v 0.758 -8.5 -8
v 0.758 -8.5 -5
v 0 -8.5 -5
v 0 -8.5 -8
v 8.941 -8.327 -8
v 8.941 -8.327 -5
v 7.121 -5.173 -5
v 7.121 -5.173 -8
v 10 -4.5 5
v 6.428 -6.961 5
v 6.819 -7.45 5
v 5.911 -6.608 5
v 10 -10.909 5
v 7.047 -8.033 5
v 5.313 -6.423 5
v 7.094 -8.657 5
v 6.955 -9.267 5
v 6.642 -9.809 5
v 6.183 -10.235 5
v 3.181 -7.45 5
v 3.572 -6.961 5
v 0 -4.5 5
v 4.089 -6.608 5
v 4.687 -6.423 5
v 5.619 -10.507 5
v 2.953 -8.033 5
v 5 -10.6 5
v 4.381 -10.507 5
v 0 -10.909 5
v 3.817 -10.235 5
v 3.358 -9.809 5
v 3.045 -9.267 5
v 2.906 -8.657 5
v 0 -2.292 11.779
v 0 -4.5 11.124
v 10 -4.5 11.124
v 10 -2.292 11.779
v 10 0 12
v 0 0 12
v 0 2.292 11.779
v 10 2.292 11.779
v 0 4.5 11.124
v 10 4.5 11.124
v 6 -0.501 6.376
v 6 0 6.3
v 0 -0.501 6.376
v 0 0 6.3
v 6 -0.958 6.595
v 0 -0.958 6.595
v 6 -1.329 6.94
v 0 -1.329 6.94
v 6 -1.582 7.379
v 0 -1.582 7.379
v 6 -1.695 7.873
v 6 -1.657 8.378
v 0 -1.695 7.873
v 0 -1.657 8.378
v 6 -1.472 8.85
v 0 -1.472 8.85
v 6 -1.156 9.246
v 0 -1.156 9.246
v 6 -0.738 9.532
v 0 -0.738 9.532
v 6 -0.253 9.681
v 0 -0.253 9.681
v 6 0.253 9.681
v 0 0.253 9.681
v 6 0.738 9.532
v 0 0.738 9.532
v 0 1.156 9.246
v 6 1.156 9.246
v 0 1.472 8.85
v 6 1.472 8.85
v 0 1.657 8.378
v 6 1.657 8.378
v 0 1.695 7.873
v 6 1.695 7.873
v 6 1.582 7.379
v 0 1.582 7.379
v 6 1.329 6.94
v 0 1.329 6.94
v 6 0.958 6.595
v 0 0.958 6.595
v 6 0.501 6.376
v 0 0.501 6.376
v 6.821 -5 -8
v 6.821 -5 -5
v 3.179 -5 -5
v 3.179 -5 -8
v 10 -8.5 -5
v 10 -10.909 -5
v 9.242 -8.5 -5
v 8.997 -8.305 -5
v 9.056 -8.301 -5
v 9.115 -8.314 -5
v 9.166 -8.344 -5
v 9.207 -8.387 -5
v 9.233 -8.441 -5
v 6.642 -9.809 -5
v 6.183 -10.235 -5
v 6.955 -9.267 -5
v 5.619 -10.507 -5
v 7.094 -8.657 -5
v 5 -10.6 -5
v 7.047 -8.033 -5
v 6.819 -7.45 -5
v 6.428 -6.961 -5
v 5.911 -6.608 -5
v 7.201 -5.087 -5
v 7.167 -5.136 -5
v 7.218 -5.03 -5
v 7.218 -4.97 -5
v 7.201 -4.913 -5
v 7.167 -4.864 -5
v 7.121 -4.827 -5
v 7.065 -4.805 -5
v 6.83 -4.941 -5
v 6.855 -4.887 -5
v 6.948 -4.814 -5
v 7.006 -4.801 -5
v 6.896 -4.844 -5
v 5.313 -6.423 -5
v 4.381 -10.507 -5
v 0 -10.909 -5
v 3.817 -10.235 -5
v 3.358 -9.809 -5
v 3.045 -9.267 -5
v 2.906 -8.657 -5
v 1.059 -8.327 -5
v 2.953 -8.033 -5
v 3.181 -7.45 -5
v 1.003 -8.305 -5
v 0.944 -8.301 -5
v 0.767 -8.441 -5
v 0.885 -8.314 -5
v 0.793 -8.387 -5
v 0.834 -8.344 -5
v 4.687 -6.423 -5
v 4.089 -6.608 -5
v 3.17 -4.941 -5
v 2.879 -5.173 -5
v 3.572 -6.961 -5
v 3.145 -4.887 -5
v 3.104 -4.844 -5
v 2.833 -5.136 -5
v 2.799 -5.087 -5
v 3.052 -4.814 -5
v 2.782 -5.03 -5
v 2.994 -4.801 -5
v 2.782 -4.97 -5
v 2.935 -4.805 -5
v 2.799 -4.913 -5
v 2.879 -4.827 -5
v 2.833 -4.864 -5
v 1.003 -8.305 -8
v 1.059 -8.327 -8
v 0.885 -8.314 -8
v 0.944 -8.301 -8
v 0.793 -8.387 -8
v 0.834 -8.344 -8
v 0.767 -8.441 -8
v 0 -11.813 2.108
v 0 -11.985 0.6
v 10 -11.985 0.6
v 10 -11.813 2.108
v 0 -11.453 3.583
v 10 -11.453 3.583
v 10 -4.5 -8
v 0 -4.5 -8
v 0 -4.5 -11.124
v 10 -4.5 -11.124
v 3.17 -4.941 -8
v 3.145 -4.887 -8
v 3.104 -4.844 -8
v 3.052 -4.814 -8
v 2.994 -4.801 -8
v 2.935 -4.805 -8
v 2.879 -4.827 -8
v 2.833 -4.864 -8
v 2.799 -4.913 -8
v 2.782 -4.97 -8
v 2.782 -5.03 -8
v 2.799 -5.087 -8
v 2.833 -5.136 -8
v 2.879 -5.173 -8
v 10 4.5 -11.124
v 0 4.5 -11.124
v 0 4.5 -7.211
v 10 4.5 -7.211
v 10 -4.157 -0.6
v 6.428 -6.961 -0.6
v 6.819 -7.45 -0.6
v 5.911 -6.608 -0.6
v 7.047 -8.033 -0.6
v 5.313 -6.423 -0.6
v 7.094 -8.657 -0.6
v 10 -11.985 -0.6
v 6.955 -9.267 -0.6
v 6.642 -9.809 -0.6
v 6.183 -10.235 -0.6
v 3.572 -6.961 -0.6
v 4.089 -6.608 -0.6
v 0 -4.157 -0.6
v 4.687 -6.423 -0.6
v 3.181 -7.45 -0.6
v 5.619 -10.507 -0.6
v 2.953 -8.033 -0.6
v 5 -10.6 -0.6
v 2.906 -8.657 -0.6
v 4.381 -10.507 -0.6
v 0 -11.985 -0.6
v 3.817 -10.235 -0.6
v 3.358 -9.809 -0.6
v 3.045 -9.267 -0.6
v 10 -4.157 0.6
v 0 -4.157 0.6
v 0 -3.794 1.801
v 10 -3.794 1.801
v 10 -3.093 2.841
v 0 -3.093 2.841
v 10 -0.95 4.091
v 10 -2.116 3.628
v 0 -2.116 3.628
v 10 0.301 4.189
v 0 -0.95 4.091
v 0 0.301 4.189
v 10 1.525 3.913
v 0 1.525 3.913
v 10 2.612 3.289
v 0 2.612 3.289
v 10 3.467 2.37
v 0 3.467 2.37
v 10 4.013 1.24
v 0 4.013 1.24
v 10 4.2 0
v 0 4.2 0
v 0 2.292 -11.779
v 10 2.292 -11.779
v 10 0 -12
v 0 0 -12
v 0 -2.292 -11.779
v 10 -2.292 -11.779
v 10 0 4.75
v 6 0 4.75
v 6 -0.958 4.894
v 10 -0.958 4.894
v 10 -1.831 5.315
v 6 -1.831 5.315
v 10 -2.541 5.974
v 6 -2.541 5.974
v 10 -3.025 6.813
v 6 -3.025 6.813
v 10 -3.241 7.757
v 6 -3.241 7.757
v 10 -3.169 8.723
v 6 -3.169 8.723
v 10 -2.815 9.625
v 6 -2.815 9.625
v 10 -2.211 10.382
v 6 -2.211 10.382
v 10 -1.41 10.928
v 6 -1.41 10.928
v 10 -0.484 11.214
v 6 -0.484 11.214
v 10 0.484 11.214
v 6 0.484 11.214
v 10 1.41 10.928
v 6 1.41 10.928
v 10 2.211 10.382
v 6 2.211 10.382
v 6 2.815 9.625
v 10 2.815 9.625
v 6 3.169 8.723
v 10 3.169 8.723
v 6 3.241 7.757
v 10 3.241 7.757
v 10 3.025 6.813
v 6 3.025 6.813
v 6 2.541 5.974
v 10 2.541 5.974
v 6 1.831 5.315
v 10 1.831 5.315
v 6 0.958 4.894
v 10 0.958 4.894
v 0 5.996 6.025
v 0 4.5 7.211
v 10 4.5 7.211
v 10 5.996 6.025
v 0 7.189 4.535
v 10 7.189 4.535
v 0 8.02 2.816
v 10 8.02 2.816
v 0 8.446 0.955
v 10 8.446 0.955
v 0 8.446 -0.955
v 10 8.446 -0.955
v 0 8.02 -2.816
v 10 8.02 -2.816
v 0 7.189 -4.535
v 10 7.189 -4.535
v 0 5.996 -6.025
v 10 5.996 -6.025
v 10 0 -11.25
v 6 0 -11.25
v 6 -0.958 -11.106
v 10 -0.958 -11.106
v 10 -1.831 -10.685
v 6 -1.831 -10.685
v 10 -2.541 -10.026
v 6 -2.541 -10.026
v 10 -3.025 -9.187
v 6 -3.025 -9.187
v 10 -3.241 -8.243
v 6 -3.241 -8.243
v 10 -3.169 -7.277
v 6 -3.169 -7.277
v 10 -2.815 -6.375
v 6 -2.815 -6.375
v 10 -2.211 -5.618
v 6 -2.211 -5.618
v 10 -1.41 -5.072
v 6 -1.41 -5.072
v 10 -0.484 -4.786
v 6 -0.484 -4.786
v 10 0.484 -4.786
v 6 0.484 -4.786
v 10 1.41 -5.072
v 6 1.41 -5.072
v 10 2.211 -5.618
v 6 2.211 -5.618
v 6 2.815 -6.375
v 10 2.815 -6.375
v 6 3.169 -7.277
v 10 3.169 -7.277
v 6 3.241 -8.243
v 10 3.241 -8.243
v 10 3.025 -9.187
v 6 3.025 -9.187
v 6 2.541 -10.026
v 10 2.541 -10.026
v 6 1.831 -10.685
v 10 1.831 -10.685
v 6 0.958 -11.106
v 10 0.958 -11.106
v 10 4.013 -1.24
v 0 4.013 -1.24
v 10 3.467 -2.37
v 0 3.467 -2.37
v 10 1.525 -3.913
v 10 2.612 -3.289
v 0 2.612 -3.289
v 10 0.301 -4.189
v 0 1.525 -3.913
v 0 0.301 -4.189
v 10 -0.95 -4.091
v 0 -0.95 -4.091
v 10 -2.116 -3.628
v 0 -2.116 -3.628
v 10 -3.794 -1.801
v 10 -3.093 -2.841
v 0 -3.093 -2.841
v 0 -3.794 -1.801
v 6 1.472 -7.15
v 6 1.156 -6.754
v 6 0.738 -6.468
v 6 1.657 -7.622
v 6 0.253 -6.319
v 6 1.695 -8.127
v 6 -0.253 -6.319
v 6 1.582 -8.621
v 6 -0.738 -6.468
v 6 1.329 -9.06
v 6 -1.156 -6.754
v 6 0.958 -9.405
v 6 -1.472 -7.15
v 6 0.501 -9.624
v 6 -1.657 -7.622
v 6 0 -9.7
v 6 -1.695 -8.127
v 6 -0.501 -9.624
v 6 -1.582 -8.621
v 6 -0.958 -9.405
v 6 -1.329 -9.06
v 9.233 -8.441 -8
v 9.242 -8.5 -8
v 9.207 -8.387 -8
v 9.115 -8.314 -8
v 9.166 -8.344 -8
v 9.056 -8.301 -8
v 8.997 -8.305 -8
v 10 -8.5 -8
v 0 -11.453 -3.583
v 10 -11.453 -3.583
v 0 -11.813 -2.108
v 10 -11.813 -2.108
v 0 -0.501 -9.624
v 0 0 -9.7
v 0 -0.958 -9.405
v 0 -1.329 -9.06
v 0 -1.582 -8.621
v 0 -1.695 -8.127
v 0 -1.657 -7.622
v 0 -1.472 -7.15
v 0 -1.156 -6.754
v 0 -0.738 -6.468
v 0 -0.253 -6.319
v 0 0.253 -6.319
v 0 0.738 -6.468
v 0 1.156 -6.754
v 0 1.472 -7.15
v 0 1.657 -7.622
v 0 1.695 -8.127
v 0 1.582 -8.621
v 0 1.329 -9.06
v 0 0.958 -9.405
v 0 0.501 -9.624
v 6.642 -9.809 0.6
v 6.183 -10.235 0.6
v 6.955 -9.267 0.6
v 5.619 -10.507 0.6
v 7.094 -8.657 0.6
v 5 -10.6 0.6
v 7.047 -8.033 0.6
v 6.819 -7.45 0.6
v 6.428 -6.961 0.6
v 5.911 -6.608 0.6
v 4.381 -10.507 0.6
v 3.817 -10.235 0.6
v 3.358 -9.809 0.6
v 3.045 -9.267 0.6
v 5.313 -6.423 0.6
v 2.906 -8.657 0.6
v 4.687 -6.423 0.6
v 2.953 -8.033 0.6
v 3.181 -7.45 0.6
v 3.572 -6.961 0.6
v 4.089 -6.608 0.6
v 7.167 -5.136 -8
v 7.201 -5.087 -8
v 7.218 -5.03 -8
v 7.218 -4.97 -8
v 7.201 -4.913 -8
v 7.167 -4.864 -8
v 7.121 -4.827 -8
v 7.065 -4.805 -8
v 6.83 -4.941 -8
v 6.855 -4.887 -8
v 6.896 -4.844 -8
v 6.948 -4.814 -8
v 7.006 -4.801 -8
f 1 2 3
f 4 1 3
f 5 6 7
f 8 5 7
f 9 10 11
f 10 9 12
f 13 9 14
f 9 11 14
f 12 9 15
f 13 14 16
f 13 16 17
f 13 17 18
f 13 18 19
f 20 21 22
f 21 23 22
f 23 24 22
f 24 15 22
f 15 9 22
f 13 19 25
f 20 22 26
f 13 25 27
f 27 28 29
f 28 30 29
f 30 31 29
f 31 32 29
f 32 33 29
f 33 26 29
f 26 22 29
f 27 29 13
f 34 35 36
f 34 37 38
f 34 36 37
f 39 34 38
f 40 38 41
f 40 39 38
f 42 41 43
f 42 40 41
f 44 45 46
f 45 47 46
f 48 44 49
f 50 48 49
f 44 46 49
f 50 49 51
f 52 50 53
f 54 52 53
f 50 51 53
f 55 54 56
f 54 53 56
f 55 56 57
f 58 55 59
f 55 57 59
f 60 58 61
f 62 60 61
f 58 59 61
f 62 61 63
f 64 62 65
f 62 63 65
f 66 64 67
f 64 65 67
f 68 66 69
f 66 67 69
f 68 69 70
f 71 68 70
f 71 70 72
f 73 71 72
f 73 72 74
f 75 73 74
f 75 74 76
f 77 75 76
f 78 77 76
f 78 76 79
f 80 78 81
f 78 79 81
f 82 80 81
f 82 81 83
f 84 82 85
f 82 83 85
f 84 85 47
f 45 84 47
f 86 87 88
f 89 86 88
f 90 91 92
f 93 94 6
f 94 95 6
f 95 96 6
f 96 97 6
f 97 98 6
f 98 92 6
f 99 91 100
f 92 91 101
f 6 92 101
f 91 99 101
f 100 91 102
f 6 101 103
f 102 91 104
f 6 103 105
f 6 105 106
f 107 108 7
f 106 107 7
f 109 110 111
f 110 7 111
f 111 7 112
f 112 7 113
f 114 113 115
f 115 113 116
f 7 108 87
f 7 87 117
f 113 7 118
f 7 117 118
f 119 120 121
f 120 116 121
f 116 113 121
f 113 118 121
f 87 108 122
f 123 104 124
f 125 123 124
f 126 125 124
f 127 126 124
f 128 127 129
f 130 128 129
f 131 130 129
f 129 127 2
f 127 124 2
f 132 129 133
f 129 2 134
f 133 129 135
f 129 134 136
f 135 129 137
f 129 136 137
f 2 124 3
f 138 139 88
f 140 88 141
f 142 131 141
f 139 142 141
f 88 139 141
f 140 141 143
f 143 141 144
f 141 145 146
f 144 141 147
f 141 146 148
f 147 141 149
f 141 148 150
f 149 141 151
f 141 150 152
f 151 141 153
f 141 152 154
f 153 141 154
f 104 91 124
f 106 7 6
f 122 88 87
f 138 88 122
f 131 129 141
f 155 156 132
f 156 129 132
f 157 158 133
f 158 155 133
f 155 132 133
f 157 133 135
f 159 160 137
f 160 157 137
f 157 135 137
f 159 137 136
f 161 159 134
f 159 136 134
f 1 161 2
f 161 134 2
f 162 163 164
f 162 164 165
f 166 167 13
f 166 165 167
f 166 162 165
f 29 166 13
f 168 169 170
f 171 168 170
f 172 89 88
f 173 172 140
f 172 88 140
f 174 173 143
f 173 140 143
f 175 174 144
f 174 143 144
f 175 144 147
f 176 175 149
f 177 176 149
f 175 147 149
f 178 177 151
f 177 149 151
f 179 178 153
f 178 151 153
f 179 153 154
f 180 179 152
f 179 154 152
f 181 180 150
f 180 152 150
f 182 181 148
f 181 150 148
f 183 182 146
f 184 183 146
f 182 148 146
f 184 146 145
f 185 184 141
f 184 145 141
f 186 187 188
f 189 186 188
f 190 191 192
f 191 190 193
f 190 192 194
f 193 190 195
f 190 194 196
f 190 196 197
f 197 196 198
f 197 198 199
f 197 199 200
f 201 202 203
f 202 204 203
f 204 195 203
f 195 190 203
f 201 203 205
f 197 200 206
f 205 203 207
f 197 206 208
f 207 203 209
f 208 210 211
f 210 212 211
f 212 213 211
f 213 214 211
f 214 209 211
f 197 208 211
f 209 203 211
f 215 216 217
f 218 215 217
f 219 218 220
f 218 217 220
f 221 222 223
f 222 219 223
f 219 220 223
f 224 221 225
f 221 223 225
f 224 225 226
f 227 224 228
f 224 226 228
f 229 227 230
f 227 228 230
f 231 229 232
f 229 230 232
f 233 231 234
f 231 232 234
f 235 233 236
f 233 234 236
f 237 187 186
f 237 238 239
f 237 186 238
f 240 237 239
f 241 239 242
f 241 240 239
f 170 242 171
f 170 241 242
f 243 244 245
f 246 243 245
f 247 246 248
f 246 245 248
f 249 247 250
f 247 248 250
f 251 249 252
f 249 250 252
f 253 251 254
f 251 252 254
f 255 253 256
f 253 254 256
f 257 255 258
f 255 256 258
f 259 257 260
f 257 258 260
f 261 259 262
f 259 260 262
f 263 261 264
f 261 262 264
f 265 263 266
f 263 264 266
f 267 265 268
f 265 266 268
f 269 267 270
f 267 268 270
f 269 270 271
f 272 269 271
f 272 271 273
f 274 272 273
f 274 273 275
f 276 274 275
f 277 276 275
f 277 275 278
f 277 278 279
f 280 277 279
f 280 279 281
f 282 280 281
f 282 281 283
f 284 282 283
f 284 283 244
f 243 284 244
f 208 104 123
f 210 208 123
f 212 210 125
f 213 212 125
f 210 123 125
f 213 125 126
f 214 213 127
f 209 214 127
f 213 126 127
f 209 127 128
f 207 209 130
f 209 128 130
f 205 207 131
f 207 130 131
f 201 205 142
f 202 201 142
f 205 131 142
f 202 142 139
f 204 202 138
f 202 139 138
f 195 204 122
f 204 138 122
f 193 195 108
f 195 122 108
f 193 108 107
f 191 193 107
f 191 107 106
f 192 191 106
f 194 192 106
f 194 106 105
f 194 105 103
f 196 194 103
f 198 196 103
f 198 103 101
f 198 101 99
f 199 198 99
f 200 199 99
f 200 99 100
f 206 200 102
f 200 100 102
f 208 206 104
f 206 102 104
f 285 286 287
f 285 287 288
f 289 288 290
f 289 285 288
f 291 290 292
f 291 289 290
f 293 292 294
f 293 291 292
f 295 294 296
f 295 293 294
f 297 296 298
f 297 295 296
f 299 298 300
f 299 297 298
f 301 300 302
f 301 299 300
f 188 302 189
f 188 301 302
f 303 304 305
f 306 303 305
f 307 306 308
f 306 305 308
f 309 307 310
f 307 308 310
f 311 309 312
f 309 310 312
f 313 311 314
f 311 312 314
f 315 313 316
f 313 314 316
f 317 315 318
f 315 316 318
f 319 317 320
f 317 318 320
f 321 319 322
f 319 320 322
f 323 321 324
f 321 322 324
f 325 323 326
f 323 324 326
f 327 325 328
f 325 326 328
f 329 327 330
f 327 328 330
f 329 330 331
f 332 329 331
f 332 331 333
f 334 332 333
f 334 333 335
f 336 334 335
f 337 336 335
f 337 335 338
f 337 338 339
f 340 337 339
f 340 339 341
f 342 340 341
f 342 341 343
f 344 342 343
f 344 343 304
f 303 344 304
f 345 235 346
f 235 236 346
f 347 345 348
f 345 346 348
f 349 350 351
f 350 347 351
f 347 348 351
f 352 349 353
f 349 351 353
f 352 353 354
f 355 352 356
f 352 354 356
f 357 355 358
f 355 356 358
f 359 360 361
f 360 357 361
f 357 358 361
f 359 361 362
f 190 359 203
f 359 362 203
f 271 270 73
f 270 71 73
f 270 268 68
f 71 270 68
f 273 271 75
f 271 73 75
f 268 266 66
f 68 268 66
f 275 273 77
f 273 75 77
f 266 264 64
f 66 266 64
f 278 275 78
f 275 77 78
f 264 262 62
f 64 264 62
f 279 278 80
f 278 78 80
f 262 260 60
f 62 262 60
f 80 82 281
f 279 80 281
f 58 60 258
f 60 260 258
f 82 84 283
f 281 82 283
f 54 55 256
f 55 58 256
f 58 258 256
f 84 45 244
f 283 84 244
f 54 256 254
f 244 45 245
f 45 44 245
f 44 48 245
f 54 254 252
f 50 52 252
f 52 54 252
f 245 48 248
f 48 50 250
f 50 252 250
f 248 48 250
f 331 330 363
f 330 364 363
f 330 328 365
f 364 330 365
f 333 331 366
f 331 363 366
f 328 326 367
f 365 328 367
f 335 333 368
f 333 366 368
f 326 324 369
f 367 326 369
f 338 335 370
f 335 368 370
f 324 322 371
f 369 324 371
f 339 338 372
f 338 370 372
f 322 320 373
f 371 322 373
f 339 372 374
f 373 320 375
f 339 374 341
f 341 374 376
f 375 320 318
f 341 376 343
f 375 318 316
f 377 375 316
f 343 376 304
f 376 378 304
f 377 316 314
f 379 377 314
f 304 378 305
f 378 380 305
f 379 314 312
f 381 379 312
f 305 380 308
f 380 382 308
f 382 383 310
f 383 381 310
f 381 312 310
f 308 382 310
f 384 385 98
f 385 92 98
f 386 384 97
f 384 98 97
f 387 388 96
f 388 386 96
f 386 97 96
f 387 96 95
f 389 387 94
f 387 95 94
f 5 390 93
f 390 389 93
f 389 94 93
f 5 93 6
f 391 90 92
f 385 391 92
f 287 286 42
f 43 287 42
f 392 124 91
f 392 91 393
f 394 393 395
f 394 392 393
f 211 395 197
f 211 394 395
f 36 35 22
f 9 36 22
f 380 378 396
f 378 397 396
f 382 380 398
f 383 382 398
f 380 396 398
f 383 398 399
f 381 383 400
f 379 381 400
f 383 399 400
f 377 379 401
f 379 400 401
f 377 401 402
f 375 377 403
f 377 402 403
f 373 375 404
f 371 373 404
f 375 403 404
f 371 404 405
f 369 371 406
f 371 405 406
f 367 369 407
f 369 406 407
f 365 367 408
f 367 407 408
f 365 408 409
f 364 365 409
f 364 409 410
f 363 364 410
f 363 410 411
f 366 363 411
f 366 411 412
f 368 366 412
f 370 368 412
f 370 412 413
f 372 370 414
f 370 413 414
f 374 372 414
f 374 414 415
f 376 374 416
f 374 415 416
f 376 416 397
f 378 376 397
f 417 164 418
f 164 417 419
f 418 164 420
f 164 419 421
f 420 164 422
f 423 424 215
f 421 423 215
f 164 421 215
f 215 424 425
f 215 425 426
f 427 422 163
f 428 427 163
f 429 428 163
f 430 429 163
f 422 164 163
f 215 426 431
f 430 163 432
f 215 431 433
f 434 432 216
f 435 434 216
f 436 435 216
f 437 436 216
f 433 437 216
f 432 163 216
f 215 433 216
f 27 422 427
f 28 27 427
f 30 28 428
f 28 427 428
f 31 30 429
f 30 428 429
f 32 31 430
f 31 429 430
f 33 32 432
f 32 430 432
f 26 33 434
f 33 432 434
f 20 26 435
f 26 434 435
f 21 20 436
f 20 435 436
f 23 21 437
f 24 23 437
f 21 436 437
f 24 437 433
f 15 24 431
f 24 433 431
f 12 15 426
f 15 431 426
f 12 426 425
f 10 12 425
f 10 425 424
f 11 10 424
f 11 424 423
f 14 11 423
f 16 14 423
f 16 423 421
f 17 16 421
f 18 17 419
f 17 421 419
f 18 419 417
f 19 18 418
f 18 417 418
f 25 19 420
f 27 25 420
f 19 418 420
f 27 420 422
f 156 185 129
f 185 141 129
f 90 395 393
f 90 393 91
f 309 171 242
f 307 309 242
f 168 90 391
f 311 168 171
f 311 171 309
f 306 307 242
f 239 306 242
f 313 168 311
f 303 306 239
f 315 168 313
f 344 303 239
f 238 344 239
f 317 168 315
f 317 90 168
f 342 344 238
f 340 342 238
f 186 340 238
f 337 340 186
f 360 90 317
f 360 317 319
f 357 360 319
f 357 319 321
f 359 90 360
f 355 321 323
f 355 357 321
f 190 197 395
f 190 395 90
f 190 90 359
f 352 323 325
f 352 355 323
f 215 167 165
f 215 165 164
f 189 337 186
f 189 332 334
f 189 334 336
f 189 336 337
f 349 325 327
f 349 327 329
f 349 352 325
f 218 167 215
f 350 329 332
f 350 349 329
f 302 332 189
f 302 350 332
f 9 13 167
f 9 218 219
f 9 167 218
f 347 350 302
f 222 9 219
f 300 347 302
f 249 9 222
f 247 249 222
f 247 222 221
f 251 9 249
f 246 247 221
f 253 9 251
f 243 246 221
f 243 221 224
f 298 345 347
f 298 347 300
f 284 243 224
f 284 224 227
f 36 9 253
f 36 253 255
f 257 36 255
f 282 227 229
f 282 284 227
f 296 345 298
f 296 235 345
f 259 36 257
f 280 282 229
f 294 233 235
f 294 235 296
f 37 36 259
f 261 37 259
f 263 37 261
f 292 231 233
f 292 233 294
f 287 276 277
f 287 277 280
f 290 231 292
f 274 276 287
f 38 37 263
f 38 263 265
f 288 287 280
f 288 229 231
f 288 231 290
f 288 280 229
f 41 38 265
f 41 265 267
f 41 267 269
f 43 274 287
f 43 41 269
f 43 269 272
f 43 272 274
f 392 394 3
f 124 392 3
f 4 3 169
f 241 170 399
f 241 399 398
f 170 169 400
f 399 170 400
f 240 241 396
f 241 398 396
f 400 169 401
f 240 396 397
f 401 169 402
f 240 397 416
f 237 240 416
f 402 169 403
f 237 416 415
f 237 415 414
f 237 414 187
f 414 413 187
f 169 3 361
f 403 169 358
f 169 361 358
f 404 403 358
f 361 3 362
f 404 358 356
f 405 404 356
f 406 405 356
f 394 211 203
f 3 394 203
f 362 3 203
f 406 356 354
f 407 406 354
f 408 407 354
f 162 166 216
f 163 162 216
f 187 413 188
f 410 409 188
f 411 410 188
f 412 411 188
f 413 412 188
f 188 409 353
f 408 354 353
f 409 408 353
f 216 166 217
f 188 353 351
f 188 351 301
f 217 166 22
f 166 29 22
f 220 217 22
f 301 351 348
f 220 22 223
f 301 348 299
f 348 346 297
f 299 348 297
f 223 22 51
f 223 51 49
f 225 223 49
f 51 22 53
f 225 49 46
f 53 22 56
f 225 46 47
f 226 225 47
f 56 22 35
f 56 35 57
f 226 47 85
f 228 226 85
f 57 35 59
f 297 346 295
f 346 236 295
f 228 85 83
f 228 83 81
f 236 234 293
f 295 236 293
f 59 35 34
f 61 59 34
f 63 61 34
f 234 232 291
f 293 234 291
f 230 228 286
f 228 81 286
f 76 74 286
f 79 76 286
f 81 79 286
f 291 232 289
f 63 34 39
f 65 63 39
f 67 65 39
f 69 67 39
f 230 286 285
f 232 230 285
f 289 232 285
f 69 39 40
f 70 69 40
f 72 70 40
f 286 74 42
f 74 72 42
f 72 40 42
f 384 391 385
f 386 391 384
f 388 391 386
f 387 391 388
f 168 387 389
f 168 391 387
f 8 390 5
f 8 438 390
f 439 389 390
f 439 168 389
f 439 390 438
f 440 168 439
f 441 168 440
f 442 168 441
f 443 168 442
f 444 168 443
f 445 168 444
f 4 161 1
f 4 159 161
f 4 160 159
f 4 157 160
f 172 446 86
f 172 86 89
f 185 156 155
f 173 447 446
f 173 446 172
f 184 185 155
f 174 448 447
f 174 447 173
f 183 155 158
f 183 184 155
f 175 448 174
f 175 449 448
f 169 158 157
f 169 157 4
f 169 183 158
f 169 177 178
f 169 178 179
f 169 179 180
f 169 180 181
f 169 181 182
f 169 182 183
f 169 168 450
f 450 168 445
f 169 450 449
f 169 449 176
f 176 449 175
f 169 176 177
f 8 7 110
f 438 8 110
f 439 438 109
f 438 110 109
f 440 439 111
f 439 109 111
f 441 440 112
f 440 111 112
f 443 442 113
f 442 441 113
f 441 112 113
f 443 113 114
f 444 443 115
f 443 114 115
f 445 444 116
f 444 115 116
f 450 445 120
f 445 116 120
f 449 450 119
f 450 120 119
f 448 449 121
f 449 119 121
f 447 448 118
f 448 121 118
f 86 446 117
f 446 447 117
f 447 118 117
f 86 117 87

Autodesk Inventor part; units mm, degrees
ref_plane "YZ Plane" through (0, 0, 0) normal (1, 0, 0) x (0, 1, 0)
ref_plane "XZ Plane" through (0, 0, 0) normal (0, 1, 0) x (-1, 0, 0)
ref_plane "XY Plane" through (0, 0, 0) normal (0, 0, 1) x (1, 0, 0)
sketch "スケッチ1" plane through (0, 0, 0) normal (1, 0, 0) x (0, 1, 0)
  circle A0 centre (0, 0) radius 4.2
  circle A1 centre (0, 0) radius 8.5
  line L0 (0, 5) -> (-12, 5)
  line L1 (-12, 5) -> (-12, -5) construction
  line L2 (-12, -5) -> (0, -5)
  line L3 (0, -5) -> (0, 5) construction
  line L4 (-12, 0.6) -> (0, 0.6)
  line L5 (0, 0.6) -> (0, -0.6)
  line L6 (0, -0.6) -> (-12, -0.6)
  line L7 (-12, -0.6) -> (-12, 0.6)
  line L8 (4.5, 12) -> (-4.5, 12) construction
  line L9 (-4.5, 12) -> (-4.5, -12)
  line L10 (-4.5, -12) -> (4.5, -12) construction
  line L11 (4.5, -12) -> (4.5, 12)
  line L12 (4.5, 12) -> (-4.5, -12) construction
  line L13 (-4.5, 12) -> (4.5, -12) construction
  arc A2 (4.5, 11.1243) -> (-4.5, 11.1243) centre (0, 0) ccw
  arc A3 (-4.5, -11.1243) -> (4.5, -11.1243) centre (0, 0) ccw
  arc A4 (-10.9087, 5) -> (-10.9087, -5) centre (0, 0) ccw
  point P0 (-11, 3.3541)
  point P1 (-11, -3.3541)
  point P2 (-6.8739, 5)
  point P3 (-6.8739, -5)
  point P4 (-4.1569, 0.6)
  point P5 (-4.1569, -0.6)
  point P6 (-12, -0.6)
  point P7 (-8.4788, -0.6)
  point P8 (-8.4788, 0.6)
  point P9 (0, -4.2)
  point P10 (0, 4.2)
  point P11 (0, 0.6)
  point P12 (-4.5, -5)
  point P13 (4.5, -7.2111)
  point P14 (4.5, 7.2111)
  point P15 (-4.5, 5)
  point P16 (-4.5, -7.2111)
  point P17 (-4.5, 7.2111)
  point P18 (-4.5, 0.6)
  point P19 (-4.5, -0.6)
  point P20 (-11.985, 0.6)
  point P21 (-11.985, -0.6)
  dimension "d0" = 8.4
  dimension "d1" = 17
  dimension "d2" = 5
  dimension "d3" = 5
  dimension "d4" = 12
  dimension "d18" = 1.2
  dimension "d19" = 0.6
  dimension "d45" = 9
  dimension "d46" = 24
extrude "押し出し1" add sketch "スケッチ1" along normal blind 10 contours A0 L4 L9 A1 L11 L6 | L4 A1 L0 L9 | L9 L2 A1 L6 | L4 A4 L0 A1 | A1 L2 A4 L6 | L9 A2 L11 A1 | A1 L11 A3 L9 | A1 L11
sketch "スケッチ2" plane through (10, 0, 0) normal (1, 0, 0) x (0, 0, -1)
  line L0 (16.8, 0) -> (-16.8, 0) projected
  point P0 (0, 0)
  point P1 (-8, 0)
  point P2 (8, 0)
  dimension "d7" = 8
  dimension "d8" = 8
hole "穴1" at (10, 0, 8) at (10, 0, -8) direction (-1, 0, 0) diameter 3.4 end through all counterbore diameter 6.5 counterbore depth 4
sketch "スケッチ3" plane through (0, -4.5, 5) normal (0, 0, 1) x (1, 0, 0)
  line L0 (0, 0) -> (10, 0) projected
  point P0 (5, -4)
  point P1 (5, 0)
  dimension "d56" = 4
hole "穴2" at (5, -8.5, 5) direction (0, 0, -1) diameter 4.2 end through all
sketch "スケッチ7" plane through (0, -10.9087, -5) normal (0, 0, -1) x (-1, 0, 0)
  circle A0 centre (-5, 2.4087) radius 2.1 projected
  line L0 (-7.0207, -1.0913) -> (-9.0415, 2.4087)
  line L1 (-9.0415, 2.4087) -> (-7.0207, 5.9087)
  line L2 (-7.0207, 5.9087) -> (-2.9793, 5.9087)
  line L3 (-2.9793, 5.9087) -> (-0.9585, 2.4087)
  line L4 (-0.9585, 2.4087) -> (-2.9793, -1.0913)
  line L5 (-2.9793, -1.0913) -> (-7.0207, -1.0913)
  line L6 (0, 6.4087) -> (-10, 6.4087) projected
  line L7 (-10, 0) -> (-10, 6.4087) projected
  line L8 (0, 0) -> (0, 6.4087) projected
  line L9 (-10, 2.4087) -> (-9.0415, 2.4087)
  line L10 (-0.9585, 2.4087) -> (0, 2.4087)
  circle A1 centre (-9.0415, 2.4087) radius 0.2
  circle A2 centre (-7.0207, -1.0913) radius 0.2
  circle A3 centre (-2.9793, -1.0913) radius 0.2
  circle A4 centre (-0.9585, 2.4087) radius 0.2
  circle A5 centre (-2.9793, 5.9087) radius 0.2
  circle A6 centre (-7.0207, 5.9087) radius 0.2
  point P0 (0, 10.9087)
  point P1 (-9.2415, 2.4087)
  point P2 (-8.9415, 2.5819)
  point P3 (-7.1207, 5.7355)
  point P4 (-6.8207, 5.9087)
  point P5 (-3.1793, 5.9087)
  point P6 (-2.8793, 5.7355)
  point P7 (-1.0585, 2.5819)
  point P8 (-0.7585, 2.4087)
  dimension "d48" = 7
  dimension "d49" = 0.4
  dimension "d52" = 360
extrude "押し出し5" add sketch "スケッチ7" along normal blind 3 contours L9 L7 L6 L8 L10 A4 L3 A5 L2 A6 L1 A1
equation "\"d3\" = d2"
equation "\"d19\" = 0.5 * d18"
equation "\"d8\" = d7"
properties part number "セットカラ―" material "ABS プラスチック"
